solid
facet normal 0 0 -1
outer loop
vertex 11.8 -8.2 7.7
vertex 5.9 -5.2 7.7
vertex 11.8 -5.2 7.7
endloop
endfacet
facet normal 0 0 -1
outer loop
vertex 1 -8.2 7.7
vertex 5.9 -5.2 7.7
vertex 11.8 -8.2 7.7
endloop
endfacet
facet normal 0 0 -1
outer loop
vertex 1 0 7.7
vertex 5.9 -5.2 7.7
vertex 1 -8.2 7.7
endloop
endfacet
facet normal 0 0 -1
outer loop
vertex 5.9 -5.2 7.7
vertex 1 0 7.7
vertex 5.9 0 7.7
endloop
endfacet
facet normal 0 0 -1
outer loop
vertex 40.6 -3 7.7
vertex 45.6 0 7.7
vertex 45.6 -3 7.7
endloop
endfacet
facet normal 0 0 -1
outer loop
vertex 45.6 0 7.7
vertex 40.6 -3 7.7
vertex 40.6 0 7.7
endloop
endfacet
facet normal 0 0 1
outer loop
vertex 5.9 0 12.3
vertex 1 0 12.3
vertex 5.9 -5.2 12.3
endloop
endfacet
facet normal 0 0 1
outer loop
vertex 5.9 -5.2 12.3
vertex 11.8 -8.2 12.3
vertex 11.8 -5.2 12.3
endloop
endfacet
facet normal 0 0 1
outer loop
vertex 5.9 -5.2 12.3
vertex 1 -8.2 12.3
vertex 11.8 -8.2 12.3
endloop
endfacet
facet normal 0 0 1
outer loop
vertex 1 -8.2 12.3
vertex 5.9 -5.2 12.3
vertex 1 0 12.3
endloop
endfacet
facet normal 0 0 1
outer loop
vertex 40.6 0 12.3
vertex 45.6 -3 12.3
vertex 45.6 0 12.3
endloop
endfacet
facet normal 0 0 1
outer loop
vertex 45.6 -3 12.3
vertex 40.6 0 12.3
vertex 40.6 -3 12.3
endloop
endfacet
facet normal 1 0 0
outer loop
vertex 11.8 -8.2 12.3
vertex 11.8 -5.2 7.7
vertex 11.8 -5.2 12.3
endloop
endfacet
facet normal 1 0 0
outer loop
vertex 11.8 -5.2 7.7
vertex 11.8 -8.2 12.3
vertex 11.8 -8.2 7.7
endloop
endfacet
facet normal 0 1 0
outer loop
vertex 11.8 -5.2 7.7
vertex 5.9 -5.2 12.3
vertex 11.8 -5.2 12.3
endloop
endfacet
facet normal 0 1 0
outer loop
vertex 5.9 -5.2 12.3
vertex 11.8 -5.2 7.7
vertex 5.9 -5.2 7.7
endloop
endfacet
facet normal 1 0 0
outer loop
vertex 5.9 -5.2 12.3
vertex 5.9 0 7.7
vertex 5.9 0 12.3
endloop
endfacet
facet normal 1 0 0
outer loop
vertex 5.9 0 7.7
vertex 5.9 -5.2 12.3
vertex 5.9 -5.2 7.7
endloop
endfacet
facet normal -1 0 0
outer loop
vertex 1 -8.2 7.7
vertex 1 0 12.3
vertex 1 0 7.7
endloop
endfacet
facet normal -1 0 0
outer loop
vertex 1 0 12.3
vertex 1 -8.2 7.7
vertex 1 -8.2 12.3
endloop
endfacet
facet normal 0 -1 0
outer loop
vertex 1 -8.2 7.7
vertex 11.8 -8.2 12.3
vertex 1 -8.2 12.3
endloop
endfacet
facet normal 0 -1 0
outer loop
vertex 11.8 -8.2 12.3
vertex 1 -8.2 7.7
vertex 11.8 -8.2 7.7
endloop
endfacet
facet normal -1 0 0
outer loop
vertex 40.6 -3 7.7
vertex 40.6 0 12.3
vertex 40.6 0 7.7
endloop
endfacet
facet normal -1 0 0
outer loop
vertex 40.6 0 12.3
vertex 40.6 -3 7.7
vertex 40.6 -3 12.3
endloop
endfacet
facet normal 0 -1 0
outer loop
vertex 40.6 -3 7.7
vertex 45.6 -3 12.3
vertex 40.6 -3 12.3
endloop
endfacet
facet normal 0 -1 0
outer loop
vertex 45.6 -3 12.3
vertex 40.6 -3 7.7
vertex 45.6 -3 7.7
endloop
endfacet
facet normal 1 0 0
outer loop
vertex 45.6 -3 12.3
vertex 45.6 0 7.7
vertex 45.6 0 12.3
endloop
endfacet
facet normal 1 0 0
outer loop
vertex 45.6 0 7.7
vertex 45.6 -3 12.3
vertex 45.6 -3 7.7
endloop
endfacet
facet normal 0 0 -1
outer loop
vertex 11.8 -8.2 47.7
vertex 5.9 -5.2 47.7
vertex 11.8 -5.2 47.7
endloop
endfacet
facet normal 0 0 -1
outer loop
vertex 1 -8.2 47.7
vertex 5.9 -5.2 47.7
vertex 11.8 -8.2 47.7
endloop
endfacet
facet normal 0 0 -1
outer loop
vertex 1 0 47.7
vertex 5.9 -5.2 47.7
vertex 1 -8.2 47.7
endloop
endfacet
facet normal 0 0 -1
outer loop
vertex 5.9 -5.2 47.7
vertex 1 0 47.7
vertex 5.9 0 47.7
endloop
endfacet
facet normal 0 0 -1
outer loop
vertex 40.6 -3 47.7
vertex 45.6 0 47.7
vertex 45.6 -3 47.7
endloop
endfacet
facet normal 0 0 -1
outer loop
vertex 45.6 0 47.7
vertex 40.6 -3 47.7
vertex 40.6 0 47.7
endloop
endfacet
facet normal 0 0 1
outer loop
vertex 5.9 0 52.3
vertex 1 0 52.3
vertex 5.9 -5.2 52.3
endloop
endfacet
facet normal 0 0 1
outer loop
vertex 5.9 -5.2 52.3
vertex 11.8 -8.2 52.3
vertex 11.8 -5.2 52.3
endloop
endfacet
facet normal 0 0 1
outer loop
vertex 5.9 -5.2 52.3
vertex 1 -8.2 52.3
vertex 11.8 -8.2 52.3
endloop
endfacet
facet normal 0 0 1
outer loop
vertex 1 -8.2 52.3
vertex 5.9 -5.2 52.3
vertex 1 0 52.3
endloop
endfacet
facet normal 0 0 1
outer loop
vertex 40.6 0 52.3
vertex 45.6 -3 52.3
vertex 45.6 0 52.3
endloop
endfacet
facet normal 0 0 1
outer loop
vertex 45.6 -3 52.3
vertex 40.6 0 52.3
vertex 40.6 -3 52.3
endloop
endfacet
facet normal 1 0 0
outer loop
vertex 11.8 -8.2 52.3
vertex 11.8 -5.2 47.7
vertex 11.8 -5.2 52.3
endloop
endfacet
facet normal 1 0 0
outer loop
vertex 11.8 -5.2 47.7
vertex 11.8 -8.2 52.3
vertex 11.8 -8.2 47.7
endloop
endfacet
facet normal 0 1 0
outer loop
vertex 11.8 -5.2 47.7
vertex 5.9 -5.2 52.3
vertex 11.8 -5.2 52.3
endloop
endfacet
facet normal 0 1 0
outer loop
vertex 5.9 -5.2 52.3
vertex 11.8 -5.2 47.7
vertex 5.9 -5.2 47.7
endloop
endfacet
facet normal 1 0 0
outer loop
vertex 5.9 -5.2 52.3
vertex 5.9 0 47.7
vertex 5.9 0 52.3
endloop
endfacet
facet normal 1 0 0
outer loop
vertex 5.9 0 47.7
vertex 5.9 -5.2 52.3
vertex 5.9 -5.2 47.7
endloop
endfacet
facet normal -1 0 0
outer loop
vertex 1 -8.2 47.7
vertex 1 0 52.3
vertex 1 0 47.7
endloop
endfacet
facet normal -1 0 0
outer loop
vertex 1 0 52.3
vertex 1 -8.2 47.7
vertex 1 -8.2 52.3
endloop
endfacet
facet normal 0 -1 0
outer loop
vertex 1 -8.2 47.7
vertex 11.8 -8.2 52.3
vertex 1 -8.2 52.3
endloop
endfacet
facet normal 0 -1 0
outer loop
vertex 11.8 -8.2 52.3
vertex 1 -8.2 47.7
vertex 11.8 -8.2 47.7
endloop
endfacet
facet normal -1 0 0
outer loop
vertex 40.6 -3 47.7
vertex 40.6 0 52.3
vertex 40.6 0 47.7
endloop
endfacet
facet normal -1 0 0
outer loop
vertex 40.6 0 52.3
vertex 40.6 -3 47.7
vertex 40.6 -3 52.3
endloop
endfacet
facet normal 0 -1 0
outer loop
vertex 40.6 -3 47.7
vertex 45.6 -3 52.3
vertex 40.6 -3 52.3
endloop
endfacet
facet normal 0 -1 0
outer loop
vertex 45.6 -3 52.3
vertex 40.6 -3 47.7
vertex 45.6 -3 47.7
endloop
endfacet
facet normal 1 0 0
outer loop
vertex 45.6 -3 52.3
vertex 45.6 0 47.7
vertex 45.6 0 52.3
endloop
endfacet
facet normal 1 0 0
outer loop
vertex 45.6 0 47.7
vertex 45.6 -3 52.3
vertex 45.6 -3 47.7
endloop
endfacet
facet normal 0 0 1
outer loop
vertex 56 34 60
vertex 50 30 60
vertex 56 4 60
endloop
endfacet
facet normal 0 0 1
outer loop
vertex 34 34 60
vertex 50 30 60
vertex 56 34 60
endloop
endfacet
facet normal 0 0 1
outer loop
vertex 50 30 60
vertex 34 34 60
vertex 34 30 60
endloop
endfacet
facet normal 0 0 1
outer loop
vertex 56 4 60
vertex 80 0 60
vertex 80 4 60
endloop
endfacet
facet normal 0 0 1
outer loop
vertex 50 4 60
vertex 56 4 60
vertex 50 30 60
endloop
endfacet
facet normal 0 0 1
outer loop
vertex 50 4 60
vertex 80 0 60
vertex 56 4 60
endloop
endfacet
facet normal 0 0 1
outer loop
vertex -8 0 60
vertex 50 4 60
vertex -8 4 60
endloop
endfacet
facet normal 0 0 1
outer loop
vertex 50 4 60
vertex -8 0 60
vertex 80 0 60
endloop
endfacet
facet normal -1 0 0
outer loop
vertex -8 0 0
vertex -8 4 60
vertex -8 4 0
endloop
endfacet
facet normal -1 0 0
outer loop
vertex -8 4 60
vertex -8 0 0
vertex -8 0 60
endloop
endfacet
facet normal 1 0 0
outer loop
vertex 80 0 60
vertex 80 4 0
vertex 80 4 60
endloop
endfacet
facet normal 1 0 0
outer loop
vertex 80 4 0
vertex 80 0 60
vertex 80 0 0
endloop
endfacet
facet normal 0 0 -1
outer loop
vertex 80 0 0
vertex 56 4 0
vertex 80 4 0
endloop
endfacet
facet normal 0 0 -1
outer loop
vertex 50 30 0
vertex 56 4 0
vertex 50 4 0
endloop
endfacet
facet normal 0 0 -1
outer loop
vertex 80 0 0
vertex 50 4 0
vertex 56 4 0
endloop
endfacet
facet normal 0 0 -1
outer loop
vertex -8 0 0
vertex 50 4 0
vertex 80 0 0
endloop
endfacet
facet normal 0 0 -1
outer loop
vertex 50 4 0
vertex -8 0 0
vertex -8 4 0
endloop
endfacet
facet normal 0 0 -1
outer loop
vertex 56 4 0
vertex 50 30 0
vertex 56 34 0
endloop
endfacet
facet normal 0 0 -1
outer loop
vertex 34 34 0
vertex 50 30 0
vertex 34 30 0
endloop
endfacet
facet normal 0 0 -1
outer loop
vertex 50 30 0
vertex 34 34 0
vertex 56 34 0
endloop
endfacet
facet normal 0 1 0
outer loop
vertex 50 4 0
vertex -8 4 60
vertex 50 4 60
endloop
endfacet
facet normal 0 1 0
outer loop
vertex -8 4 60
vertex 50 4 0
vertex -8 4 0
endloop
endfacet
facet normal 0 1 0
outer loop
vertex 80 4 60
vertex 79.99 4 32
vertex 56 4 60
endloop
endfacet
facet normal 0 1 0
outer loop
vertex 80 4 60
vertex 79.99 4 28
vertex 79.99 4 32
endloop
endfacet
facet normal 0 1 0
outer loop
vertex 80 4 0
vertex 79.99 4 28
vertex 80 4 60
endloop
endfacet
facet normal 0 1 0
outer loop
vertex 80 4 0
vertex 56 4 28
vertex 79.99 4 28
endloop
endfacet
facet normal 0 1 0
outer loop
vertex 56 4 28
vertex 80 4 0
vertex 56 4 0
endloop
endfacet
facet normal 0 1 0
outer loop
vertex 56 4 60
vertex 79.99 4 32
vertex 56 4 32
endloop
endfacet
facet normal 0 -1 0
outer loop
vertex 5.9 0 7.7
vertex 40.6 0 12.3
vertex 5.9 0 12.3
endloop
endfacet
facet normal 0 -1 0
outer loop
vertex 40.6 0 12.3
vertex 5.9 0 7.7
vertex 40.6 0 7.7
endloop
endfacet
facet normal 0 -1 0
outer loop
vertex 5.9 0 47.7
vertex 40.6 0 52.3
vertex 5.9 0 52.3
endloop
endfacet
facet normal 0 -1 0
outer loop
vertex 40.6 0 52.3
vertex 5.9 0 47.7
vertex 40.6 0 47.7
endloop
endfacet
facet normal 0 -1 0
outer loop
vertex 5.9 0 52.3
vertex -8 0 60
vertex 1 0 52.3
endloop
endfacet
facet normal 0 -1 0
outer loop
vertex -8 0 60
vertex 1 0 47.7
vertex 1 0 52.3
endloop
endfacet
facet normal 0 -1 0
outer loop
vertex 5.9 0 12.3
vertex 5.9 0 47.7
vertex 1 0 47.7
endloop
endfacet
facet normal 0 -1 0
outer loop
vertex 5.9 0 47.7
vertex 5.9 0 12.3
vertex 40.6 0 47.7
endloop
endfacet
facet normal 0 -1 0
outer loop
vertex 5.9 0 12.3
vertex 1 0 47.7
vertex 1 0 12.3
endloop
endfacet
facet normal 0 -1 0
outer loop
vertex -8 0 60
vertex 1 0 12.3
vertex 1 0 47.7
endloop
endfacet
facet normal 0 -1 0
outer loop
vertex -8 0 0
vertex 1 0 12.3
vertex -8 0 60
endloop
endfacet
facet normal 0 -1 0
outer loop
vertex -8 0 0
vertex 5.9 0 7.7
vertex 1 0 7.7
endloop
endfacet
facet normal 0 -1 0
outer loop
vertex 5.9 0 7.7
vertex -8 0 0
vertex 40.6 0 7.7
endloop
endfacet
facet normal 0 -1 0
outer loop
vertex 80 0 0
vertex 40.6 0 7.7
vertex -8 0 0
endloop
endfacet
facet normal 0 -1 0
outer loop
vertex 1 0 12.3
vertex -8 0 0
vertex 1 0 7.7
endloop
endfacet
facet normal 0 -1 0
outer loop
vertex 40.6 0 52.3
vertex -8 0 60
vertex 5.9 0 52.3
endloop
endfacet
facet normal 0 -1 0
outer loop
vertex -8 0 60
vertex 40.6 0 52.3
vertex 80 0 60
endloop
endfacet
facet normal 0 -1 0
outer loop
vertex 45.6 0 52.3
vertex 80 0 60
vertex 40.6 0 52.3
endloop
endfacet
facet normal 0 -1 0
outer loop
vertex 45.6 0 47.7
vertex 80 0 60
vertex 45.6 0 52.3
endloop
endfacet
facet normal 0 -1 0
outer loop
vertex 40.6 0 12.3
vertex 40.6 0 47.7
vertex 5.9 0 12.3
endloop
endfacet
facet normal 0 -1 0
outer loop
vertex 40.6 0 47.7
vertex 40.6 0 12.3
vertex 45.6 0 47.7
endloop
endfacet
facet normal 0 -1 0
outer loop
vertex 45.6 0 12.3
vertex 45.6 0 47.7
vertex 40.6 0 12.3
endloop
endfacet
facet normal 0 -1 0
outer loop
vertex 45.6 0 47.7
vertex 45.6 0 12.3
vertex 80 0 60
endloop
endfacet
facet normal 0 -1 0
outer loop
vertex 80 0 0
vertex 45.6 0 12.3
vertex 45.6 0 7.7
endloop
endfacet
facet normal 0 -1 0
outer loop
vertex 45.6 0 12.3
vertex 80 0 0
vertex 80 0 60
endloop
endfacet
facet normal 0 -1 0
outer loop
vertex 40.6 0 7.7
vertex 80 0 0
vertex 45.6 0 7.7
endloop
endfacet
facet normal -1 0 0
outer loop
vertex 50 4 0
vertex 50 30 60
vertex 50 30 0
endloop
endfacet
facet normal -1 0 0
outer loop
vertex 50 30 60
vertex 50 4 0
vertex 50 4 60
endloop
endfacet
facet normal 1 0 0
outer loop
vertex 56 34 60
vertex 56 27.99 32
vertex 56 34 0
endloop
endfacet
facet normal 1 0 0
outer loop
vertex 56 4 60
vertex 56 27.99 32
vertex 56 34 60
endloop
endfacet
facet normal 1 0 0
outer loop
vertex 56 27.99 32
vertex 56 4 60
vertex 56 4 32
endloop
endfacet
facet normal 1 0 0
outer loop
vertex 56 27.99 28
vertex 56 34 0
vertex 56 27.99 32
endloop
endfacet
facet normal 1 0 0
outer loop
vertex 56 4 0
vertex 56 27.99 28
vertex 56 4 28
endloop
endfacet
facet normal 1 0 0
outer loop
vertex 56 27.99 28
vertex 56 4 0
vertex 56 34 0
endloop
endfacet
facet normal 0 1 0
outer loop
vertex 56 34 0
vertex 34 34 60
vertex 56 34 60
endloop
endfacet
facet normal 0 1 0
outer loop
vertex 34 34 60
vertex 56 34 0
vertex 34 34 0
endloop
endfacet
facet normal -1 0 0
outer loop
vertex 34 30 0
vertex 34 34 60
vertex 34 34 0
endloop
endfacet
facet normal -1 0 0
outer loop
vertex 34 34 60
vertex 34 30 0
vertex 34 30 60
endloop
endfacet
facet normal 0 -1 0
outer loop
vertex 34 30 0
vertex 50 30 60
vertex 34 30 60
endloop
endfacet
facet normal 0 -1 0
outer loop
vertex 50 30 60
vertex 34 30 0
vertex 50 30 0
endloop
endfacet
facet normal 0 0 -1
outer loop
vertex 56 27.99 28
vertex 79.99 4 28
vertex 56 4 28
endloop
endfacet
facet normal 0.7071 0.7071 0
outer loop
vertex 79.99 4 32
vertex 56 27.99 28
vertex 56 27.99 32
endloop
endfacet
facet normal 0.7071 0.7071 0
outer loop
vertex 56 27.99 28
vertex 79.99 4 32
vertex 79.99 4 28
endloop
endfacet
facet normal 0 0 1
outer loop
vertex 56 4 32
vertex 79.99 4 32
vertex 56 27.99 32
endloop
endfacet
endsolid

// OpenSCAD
// file: skadis-lib.scad
// Shared pieces for the SKÅDIS accessories. Not printed on its own.
//
// Frame for an accessory: the board's FRONT face is the plane y = 0 (the board fills
// y -5..0), x runs across the board, z up, and z = 0 is the centre of the slot the upper
// hanger uses. Every accessory is built in this frame and saved with as_print(), which lays
// it on its side (x becomes the print's z), so the hangers print with their layers running
// along the lip and nothing needs support.
//
// The hanger is IKEA's own way of holding on, proven on skadis-hook.scad: a 4.6 mm wide tab
// goes through a slot and a lip behind the board drops 5.9 mm below the slot; a short peg
// sits in the slot 40 mm below so the piece cannot tip, swing or lift by accident. Lift it
// 6 mm to take it off. Two hangers 40 mm apart (two slots of one row) carry anything heavy.
//
// Profile (u out from the front face, v up from the upper slot's centre), dropped position:
//   tab  u -5.2..0,    v -5.9..-1    rests on the slot's rounded bottom (-5.98 for a 4.6 tab)
//   lip  u -8.2..-5.2, v -11.8..-1   5.8 mm of board behind it
//   peg  u -3..0,      v -45.6..-40.6
// Raised 5.9 for fitting, the tab and lip (10.8 tall) pass the slot, whose straight height
// for a 4.6 mm part is 11.96; the peg stays inside the lower slot (usable -45.98..-34.02).

hanger_w = 4.6;
hanger_drop = 5.9;
hanger_bottom = -45.6;        // the lowest point of a hanger (the peg's bottom)
key_len = 13; key_neck = 5; key_tip = 11; key_depth = 3.5;
key_poly = [[-key_len / 2, -key_tip / 2], [-key_len / 2, key_tip / 2], [0, key_neck / 2], [key_len / 2, key_tip / 2], [key_len / 2, -key_tip / 2], [0, -key_neck / 2]];

module hanger2d() {
    translate([-5.2, -5.9]) square([5.2 + 0.01, 4.9]);
    translate([-8.2, -11.8]) square([3, 10.8]);
    translate([-3, -45.6]) square([3 + 0.01, 5]);
}
// extrude a 2D (u, v) profile along x, from x0 to x0 + w
module along_x(x0, w) multmatrix([[0, 0, 1, x0], [1, 0, 0, 0], [0, 1, 0, 0], [0, 0, 0, 1]]) linear_extrude(w) children();
module hanger(x) along_x(x - hanger_w / 2, hanger_w) hanger2d();
module hangers(xs) for (x = xs) hanger(x);
// a slab from the front face: u 0..t, v v0..v1, x x0..x1 (the spine that sits on the board)
module spine(x0, x1, v0, v1, t = 4) translate([x0, 0, v0]) cube([x1 - x0, t, v1 - v0]);
// lay the finished accessory on its side for printing: x up, lying on its x = 0 face
module as_print() rotate([0, -90, 0]) children();
// rounded 2D rectangle, for arms and lips
module rr(w, h, r) offset(r = r, $fn = 24) offset(delta = -r) square([w, h]);
// main file
// Keyboard perch, a pair: two 60 mm ledges that park a keyboard on the board, on edge,
// leaning back against it (the NuPhy Air75 V2 when the controller is out). Each ledge is
// 30 deep with a 16 mm lip, so a board up to 26 mm thick sits in it; two hangers each.
// Hang the two in one slot row, 5 columns apart (200 mm) for a 75 % keyboard, further for
// a full size. Print on the side, as saved, PETG, 4 walls, 30 % infill. x2 (one pair)
//   openscad -o skadis-keyboard-perch-x2.stl skadis-keyboard-perch.scad

include <skadis-lib.scad>

W = 60; D = 30; lip = 16; t = 6; spine_t = 4; gusset = 24;
v_top = -50;
hx = [W / 2 - 20, W / 2 + 20];

module piece() {
    hangers(hx);
    spine(0, W, v_top - t - gusset, 8, spine_t);
    translate([0, 0, v_top - t]) cube([W, spine_t + D, t]);
    translate([0, spine_t + D - 4, v_top - t]) cube([W, 4, t + lip]);
    translate([W / 2 - 2, 0, 0]) rotate([90, 0, 90]) linear_extrude(4)
        polygon([[spine_t - 0.01, v_top - t + 0.01], [spine_t + gusset, v_top - t + 0.01], [spine_t - 0.01, v_top - t - gusset]]);
}
as_print() piece();
